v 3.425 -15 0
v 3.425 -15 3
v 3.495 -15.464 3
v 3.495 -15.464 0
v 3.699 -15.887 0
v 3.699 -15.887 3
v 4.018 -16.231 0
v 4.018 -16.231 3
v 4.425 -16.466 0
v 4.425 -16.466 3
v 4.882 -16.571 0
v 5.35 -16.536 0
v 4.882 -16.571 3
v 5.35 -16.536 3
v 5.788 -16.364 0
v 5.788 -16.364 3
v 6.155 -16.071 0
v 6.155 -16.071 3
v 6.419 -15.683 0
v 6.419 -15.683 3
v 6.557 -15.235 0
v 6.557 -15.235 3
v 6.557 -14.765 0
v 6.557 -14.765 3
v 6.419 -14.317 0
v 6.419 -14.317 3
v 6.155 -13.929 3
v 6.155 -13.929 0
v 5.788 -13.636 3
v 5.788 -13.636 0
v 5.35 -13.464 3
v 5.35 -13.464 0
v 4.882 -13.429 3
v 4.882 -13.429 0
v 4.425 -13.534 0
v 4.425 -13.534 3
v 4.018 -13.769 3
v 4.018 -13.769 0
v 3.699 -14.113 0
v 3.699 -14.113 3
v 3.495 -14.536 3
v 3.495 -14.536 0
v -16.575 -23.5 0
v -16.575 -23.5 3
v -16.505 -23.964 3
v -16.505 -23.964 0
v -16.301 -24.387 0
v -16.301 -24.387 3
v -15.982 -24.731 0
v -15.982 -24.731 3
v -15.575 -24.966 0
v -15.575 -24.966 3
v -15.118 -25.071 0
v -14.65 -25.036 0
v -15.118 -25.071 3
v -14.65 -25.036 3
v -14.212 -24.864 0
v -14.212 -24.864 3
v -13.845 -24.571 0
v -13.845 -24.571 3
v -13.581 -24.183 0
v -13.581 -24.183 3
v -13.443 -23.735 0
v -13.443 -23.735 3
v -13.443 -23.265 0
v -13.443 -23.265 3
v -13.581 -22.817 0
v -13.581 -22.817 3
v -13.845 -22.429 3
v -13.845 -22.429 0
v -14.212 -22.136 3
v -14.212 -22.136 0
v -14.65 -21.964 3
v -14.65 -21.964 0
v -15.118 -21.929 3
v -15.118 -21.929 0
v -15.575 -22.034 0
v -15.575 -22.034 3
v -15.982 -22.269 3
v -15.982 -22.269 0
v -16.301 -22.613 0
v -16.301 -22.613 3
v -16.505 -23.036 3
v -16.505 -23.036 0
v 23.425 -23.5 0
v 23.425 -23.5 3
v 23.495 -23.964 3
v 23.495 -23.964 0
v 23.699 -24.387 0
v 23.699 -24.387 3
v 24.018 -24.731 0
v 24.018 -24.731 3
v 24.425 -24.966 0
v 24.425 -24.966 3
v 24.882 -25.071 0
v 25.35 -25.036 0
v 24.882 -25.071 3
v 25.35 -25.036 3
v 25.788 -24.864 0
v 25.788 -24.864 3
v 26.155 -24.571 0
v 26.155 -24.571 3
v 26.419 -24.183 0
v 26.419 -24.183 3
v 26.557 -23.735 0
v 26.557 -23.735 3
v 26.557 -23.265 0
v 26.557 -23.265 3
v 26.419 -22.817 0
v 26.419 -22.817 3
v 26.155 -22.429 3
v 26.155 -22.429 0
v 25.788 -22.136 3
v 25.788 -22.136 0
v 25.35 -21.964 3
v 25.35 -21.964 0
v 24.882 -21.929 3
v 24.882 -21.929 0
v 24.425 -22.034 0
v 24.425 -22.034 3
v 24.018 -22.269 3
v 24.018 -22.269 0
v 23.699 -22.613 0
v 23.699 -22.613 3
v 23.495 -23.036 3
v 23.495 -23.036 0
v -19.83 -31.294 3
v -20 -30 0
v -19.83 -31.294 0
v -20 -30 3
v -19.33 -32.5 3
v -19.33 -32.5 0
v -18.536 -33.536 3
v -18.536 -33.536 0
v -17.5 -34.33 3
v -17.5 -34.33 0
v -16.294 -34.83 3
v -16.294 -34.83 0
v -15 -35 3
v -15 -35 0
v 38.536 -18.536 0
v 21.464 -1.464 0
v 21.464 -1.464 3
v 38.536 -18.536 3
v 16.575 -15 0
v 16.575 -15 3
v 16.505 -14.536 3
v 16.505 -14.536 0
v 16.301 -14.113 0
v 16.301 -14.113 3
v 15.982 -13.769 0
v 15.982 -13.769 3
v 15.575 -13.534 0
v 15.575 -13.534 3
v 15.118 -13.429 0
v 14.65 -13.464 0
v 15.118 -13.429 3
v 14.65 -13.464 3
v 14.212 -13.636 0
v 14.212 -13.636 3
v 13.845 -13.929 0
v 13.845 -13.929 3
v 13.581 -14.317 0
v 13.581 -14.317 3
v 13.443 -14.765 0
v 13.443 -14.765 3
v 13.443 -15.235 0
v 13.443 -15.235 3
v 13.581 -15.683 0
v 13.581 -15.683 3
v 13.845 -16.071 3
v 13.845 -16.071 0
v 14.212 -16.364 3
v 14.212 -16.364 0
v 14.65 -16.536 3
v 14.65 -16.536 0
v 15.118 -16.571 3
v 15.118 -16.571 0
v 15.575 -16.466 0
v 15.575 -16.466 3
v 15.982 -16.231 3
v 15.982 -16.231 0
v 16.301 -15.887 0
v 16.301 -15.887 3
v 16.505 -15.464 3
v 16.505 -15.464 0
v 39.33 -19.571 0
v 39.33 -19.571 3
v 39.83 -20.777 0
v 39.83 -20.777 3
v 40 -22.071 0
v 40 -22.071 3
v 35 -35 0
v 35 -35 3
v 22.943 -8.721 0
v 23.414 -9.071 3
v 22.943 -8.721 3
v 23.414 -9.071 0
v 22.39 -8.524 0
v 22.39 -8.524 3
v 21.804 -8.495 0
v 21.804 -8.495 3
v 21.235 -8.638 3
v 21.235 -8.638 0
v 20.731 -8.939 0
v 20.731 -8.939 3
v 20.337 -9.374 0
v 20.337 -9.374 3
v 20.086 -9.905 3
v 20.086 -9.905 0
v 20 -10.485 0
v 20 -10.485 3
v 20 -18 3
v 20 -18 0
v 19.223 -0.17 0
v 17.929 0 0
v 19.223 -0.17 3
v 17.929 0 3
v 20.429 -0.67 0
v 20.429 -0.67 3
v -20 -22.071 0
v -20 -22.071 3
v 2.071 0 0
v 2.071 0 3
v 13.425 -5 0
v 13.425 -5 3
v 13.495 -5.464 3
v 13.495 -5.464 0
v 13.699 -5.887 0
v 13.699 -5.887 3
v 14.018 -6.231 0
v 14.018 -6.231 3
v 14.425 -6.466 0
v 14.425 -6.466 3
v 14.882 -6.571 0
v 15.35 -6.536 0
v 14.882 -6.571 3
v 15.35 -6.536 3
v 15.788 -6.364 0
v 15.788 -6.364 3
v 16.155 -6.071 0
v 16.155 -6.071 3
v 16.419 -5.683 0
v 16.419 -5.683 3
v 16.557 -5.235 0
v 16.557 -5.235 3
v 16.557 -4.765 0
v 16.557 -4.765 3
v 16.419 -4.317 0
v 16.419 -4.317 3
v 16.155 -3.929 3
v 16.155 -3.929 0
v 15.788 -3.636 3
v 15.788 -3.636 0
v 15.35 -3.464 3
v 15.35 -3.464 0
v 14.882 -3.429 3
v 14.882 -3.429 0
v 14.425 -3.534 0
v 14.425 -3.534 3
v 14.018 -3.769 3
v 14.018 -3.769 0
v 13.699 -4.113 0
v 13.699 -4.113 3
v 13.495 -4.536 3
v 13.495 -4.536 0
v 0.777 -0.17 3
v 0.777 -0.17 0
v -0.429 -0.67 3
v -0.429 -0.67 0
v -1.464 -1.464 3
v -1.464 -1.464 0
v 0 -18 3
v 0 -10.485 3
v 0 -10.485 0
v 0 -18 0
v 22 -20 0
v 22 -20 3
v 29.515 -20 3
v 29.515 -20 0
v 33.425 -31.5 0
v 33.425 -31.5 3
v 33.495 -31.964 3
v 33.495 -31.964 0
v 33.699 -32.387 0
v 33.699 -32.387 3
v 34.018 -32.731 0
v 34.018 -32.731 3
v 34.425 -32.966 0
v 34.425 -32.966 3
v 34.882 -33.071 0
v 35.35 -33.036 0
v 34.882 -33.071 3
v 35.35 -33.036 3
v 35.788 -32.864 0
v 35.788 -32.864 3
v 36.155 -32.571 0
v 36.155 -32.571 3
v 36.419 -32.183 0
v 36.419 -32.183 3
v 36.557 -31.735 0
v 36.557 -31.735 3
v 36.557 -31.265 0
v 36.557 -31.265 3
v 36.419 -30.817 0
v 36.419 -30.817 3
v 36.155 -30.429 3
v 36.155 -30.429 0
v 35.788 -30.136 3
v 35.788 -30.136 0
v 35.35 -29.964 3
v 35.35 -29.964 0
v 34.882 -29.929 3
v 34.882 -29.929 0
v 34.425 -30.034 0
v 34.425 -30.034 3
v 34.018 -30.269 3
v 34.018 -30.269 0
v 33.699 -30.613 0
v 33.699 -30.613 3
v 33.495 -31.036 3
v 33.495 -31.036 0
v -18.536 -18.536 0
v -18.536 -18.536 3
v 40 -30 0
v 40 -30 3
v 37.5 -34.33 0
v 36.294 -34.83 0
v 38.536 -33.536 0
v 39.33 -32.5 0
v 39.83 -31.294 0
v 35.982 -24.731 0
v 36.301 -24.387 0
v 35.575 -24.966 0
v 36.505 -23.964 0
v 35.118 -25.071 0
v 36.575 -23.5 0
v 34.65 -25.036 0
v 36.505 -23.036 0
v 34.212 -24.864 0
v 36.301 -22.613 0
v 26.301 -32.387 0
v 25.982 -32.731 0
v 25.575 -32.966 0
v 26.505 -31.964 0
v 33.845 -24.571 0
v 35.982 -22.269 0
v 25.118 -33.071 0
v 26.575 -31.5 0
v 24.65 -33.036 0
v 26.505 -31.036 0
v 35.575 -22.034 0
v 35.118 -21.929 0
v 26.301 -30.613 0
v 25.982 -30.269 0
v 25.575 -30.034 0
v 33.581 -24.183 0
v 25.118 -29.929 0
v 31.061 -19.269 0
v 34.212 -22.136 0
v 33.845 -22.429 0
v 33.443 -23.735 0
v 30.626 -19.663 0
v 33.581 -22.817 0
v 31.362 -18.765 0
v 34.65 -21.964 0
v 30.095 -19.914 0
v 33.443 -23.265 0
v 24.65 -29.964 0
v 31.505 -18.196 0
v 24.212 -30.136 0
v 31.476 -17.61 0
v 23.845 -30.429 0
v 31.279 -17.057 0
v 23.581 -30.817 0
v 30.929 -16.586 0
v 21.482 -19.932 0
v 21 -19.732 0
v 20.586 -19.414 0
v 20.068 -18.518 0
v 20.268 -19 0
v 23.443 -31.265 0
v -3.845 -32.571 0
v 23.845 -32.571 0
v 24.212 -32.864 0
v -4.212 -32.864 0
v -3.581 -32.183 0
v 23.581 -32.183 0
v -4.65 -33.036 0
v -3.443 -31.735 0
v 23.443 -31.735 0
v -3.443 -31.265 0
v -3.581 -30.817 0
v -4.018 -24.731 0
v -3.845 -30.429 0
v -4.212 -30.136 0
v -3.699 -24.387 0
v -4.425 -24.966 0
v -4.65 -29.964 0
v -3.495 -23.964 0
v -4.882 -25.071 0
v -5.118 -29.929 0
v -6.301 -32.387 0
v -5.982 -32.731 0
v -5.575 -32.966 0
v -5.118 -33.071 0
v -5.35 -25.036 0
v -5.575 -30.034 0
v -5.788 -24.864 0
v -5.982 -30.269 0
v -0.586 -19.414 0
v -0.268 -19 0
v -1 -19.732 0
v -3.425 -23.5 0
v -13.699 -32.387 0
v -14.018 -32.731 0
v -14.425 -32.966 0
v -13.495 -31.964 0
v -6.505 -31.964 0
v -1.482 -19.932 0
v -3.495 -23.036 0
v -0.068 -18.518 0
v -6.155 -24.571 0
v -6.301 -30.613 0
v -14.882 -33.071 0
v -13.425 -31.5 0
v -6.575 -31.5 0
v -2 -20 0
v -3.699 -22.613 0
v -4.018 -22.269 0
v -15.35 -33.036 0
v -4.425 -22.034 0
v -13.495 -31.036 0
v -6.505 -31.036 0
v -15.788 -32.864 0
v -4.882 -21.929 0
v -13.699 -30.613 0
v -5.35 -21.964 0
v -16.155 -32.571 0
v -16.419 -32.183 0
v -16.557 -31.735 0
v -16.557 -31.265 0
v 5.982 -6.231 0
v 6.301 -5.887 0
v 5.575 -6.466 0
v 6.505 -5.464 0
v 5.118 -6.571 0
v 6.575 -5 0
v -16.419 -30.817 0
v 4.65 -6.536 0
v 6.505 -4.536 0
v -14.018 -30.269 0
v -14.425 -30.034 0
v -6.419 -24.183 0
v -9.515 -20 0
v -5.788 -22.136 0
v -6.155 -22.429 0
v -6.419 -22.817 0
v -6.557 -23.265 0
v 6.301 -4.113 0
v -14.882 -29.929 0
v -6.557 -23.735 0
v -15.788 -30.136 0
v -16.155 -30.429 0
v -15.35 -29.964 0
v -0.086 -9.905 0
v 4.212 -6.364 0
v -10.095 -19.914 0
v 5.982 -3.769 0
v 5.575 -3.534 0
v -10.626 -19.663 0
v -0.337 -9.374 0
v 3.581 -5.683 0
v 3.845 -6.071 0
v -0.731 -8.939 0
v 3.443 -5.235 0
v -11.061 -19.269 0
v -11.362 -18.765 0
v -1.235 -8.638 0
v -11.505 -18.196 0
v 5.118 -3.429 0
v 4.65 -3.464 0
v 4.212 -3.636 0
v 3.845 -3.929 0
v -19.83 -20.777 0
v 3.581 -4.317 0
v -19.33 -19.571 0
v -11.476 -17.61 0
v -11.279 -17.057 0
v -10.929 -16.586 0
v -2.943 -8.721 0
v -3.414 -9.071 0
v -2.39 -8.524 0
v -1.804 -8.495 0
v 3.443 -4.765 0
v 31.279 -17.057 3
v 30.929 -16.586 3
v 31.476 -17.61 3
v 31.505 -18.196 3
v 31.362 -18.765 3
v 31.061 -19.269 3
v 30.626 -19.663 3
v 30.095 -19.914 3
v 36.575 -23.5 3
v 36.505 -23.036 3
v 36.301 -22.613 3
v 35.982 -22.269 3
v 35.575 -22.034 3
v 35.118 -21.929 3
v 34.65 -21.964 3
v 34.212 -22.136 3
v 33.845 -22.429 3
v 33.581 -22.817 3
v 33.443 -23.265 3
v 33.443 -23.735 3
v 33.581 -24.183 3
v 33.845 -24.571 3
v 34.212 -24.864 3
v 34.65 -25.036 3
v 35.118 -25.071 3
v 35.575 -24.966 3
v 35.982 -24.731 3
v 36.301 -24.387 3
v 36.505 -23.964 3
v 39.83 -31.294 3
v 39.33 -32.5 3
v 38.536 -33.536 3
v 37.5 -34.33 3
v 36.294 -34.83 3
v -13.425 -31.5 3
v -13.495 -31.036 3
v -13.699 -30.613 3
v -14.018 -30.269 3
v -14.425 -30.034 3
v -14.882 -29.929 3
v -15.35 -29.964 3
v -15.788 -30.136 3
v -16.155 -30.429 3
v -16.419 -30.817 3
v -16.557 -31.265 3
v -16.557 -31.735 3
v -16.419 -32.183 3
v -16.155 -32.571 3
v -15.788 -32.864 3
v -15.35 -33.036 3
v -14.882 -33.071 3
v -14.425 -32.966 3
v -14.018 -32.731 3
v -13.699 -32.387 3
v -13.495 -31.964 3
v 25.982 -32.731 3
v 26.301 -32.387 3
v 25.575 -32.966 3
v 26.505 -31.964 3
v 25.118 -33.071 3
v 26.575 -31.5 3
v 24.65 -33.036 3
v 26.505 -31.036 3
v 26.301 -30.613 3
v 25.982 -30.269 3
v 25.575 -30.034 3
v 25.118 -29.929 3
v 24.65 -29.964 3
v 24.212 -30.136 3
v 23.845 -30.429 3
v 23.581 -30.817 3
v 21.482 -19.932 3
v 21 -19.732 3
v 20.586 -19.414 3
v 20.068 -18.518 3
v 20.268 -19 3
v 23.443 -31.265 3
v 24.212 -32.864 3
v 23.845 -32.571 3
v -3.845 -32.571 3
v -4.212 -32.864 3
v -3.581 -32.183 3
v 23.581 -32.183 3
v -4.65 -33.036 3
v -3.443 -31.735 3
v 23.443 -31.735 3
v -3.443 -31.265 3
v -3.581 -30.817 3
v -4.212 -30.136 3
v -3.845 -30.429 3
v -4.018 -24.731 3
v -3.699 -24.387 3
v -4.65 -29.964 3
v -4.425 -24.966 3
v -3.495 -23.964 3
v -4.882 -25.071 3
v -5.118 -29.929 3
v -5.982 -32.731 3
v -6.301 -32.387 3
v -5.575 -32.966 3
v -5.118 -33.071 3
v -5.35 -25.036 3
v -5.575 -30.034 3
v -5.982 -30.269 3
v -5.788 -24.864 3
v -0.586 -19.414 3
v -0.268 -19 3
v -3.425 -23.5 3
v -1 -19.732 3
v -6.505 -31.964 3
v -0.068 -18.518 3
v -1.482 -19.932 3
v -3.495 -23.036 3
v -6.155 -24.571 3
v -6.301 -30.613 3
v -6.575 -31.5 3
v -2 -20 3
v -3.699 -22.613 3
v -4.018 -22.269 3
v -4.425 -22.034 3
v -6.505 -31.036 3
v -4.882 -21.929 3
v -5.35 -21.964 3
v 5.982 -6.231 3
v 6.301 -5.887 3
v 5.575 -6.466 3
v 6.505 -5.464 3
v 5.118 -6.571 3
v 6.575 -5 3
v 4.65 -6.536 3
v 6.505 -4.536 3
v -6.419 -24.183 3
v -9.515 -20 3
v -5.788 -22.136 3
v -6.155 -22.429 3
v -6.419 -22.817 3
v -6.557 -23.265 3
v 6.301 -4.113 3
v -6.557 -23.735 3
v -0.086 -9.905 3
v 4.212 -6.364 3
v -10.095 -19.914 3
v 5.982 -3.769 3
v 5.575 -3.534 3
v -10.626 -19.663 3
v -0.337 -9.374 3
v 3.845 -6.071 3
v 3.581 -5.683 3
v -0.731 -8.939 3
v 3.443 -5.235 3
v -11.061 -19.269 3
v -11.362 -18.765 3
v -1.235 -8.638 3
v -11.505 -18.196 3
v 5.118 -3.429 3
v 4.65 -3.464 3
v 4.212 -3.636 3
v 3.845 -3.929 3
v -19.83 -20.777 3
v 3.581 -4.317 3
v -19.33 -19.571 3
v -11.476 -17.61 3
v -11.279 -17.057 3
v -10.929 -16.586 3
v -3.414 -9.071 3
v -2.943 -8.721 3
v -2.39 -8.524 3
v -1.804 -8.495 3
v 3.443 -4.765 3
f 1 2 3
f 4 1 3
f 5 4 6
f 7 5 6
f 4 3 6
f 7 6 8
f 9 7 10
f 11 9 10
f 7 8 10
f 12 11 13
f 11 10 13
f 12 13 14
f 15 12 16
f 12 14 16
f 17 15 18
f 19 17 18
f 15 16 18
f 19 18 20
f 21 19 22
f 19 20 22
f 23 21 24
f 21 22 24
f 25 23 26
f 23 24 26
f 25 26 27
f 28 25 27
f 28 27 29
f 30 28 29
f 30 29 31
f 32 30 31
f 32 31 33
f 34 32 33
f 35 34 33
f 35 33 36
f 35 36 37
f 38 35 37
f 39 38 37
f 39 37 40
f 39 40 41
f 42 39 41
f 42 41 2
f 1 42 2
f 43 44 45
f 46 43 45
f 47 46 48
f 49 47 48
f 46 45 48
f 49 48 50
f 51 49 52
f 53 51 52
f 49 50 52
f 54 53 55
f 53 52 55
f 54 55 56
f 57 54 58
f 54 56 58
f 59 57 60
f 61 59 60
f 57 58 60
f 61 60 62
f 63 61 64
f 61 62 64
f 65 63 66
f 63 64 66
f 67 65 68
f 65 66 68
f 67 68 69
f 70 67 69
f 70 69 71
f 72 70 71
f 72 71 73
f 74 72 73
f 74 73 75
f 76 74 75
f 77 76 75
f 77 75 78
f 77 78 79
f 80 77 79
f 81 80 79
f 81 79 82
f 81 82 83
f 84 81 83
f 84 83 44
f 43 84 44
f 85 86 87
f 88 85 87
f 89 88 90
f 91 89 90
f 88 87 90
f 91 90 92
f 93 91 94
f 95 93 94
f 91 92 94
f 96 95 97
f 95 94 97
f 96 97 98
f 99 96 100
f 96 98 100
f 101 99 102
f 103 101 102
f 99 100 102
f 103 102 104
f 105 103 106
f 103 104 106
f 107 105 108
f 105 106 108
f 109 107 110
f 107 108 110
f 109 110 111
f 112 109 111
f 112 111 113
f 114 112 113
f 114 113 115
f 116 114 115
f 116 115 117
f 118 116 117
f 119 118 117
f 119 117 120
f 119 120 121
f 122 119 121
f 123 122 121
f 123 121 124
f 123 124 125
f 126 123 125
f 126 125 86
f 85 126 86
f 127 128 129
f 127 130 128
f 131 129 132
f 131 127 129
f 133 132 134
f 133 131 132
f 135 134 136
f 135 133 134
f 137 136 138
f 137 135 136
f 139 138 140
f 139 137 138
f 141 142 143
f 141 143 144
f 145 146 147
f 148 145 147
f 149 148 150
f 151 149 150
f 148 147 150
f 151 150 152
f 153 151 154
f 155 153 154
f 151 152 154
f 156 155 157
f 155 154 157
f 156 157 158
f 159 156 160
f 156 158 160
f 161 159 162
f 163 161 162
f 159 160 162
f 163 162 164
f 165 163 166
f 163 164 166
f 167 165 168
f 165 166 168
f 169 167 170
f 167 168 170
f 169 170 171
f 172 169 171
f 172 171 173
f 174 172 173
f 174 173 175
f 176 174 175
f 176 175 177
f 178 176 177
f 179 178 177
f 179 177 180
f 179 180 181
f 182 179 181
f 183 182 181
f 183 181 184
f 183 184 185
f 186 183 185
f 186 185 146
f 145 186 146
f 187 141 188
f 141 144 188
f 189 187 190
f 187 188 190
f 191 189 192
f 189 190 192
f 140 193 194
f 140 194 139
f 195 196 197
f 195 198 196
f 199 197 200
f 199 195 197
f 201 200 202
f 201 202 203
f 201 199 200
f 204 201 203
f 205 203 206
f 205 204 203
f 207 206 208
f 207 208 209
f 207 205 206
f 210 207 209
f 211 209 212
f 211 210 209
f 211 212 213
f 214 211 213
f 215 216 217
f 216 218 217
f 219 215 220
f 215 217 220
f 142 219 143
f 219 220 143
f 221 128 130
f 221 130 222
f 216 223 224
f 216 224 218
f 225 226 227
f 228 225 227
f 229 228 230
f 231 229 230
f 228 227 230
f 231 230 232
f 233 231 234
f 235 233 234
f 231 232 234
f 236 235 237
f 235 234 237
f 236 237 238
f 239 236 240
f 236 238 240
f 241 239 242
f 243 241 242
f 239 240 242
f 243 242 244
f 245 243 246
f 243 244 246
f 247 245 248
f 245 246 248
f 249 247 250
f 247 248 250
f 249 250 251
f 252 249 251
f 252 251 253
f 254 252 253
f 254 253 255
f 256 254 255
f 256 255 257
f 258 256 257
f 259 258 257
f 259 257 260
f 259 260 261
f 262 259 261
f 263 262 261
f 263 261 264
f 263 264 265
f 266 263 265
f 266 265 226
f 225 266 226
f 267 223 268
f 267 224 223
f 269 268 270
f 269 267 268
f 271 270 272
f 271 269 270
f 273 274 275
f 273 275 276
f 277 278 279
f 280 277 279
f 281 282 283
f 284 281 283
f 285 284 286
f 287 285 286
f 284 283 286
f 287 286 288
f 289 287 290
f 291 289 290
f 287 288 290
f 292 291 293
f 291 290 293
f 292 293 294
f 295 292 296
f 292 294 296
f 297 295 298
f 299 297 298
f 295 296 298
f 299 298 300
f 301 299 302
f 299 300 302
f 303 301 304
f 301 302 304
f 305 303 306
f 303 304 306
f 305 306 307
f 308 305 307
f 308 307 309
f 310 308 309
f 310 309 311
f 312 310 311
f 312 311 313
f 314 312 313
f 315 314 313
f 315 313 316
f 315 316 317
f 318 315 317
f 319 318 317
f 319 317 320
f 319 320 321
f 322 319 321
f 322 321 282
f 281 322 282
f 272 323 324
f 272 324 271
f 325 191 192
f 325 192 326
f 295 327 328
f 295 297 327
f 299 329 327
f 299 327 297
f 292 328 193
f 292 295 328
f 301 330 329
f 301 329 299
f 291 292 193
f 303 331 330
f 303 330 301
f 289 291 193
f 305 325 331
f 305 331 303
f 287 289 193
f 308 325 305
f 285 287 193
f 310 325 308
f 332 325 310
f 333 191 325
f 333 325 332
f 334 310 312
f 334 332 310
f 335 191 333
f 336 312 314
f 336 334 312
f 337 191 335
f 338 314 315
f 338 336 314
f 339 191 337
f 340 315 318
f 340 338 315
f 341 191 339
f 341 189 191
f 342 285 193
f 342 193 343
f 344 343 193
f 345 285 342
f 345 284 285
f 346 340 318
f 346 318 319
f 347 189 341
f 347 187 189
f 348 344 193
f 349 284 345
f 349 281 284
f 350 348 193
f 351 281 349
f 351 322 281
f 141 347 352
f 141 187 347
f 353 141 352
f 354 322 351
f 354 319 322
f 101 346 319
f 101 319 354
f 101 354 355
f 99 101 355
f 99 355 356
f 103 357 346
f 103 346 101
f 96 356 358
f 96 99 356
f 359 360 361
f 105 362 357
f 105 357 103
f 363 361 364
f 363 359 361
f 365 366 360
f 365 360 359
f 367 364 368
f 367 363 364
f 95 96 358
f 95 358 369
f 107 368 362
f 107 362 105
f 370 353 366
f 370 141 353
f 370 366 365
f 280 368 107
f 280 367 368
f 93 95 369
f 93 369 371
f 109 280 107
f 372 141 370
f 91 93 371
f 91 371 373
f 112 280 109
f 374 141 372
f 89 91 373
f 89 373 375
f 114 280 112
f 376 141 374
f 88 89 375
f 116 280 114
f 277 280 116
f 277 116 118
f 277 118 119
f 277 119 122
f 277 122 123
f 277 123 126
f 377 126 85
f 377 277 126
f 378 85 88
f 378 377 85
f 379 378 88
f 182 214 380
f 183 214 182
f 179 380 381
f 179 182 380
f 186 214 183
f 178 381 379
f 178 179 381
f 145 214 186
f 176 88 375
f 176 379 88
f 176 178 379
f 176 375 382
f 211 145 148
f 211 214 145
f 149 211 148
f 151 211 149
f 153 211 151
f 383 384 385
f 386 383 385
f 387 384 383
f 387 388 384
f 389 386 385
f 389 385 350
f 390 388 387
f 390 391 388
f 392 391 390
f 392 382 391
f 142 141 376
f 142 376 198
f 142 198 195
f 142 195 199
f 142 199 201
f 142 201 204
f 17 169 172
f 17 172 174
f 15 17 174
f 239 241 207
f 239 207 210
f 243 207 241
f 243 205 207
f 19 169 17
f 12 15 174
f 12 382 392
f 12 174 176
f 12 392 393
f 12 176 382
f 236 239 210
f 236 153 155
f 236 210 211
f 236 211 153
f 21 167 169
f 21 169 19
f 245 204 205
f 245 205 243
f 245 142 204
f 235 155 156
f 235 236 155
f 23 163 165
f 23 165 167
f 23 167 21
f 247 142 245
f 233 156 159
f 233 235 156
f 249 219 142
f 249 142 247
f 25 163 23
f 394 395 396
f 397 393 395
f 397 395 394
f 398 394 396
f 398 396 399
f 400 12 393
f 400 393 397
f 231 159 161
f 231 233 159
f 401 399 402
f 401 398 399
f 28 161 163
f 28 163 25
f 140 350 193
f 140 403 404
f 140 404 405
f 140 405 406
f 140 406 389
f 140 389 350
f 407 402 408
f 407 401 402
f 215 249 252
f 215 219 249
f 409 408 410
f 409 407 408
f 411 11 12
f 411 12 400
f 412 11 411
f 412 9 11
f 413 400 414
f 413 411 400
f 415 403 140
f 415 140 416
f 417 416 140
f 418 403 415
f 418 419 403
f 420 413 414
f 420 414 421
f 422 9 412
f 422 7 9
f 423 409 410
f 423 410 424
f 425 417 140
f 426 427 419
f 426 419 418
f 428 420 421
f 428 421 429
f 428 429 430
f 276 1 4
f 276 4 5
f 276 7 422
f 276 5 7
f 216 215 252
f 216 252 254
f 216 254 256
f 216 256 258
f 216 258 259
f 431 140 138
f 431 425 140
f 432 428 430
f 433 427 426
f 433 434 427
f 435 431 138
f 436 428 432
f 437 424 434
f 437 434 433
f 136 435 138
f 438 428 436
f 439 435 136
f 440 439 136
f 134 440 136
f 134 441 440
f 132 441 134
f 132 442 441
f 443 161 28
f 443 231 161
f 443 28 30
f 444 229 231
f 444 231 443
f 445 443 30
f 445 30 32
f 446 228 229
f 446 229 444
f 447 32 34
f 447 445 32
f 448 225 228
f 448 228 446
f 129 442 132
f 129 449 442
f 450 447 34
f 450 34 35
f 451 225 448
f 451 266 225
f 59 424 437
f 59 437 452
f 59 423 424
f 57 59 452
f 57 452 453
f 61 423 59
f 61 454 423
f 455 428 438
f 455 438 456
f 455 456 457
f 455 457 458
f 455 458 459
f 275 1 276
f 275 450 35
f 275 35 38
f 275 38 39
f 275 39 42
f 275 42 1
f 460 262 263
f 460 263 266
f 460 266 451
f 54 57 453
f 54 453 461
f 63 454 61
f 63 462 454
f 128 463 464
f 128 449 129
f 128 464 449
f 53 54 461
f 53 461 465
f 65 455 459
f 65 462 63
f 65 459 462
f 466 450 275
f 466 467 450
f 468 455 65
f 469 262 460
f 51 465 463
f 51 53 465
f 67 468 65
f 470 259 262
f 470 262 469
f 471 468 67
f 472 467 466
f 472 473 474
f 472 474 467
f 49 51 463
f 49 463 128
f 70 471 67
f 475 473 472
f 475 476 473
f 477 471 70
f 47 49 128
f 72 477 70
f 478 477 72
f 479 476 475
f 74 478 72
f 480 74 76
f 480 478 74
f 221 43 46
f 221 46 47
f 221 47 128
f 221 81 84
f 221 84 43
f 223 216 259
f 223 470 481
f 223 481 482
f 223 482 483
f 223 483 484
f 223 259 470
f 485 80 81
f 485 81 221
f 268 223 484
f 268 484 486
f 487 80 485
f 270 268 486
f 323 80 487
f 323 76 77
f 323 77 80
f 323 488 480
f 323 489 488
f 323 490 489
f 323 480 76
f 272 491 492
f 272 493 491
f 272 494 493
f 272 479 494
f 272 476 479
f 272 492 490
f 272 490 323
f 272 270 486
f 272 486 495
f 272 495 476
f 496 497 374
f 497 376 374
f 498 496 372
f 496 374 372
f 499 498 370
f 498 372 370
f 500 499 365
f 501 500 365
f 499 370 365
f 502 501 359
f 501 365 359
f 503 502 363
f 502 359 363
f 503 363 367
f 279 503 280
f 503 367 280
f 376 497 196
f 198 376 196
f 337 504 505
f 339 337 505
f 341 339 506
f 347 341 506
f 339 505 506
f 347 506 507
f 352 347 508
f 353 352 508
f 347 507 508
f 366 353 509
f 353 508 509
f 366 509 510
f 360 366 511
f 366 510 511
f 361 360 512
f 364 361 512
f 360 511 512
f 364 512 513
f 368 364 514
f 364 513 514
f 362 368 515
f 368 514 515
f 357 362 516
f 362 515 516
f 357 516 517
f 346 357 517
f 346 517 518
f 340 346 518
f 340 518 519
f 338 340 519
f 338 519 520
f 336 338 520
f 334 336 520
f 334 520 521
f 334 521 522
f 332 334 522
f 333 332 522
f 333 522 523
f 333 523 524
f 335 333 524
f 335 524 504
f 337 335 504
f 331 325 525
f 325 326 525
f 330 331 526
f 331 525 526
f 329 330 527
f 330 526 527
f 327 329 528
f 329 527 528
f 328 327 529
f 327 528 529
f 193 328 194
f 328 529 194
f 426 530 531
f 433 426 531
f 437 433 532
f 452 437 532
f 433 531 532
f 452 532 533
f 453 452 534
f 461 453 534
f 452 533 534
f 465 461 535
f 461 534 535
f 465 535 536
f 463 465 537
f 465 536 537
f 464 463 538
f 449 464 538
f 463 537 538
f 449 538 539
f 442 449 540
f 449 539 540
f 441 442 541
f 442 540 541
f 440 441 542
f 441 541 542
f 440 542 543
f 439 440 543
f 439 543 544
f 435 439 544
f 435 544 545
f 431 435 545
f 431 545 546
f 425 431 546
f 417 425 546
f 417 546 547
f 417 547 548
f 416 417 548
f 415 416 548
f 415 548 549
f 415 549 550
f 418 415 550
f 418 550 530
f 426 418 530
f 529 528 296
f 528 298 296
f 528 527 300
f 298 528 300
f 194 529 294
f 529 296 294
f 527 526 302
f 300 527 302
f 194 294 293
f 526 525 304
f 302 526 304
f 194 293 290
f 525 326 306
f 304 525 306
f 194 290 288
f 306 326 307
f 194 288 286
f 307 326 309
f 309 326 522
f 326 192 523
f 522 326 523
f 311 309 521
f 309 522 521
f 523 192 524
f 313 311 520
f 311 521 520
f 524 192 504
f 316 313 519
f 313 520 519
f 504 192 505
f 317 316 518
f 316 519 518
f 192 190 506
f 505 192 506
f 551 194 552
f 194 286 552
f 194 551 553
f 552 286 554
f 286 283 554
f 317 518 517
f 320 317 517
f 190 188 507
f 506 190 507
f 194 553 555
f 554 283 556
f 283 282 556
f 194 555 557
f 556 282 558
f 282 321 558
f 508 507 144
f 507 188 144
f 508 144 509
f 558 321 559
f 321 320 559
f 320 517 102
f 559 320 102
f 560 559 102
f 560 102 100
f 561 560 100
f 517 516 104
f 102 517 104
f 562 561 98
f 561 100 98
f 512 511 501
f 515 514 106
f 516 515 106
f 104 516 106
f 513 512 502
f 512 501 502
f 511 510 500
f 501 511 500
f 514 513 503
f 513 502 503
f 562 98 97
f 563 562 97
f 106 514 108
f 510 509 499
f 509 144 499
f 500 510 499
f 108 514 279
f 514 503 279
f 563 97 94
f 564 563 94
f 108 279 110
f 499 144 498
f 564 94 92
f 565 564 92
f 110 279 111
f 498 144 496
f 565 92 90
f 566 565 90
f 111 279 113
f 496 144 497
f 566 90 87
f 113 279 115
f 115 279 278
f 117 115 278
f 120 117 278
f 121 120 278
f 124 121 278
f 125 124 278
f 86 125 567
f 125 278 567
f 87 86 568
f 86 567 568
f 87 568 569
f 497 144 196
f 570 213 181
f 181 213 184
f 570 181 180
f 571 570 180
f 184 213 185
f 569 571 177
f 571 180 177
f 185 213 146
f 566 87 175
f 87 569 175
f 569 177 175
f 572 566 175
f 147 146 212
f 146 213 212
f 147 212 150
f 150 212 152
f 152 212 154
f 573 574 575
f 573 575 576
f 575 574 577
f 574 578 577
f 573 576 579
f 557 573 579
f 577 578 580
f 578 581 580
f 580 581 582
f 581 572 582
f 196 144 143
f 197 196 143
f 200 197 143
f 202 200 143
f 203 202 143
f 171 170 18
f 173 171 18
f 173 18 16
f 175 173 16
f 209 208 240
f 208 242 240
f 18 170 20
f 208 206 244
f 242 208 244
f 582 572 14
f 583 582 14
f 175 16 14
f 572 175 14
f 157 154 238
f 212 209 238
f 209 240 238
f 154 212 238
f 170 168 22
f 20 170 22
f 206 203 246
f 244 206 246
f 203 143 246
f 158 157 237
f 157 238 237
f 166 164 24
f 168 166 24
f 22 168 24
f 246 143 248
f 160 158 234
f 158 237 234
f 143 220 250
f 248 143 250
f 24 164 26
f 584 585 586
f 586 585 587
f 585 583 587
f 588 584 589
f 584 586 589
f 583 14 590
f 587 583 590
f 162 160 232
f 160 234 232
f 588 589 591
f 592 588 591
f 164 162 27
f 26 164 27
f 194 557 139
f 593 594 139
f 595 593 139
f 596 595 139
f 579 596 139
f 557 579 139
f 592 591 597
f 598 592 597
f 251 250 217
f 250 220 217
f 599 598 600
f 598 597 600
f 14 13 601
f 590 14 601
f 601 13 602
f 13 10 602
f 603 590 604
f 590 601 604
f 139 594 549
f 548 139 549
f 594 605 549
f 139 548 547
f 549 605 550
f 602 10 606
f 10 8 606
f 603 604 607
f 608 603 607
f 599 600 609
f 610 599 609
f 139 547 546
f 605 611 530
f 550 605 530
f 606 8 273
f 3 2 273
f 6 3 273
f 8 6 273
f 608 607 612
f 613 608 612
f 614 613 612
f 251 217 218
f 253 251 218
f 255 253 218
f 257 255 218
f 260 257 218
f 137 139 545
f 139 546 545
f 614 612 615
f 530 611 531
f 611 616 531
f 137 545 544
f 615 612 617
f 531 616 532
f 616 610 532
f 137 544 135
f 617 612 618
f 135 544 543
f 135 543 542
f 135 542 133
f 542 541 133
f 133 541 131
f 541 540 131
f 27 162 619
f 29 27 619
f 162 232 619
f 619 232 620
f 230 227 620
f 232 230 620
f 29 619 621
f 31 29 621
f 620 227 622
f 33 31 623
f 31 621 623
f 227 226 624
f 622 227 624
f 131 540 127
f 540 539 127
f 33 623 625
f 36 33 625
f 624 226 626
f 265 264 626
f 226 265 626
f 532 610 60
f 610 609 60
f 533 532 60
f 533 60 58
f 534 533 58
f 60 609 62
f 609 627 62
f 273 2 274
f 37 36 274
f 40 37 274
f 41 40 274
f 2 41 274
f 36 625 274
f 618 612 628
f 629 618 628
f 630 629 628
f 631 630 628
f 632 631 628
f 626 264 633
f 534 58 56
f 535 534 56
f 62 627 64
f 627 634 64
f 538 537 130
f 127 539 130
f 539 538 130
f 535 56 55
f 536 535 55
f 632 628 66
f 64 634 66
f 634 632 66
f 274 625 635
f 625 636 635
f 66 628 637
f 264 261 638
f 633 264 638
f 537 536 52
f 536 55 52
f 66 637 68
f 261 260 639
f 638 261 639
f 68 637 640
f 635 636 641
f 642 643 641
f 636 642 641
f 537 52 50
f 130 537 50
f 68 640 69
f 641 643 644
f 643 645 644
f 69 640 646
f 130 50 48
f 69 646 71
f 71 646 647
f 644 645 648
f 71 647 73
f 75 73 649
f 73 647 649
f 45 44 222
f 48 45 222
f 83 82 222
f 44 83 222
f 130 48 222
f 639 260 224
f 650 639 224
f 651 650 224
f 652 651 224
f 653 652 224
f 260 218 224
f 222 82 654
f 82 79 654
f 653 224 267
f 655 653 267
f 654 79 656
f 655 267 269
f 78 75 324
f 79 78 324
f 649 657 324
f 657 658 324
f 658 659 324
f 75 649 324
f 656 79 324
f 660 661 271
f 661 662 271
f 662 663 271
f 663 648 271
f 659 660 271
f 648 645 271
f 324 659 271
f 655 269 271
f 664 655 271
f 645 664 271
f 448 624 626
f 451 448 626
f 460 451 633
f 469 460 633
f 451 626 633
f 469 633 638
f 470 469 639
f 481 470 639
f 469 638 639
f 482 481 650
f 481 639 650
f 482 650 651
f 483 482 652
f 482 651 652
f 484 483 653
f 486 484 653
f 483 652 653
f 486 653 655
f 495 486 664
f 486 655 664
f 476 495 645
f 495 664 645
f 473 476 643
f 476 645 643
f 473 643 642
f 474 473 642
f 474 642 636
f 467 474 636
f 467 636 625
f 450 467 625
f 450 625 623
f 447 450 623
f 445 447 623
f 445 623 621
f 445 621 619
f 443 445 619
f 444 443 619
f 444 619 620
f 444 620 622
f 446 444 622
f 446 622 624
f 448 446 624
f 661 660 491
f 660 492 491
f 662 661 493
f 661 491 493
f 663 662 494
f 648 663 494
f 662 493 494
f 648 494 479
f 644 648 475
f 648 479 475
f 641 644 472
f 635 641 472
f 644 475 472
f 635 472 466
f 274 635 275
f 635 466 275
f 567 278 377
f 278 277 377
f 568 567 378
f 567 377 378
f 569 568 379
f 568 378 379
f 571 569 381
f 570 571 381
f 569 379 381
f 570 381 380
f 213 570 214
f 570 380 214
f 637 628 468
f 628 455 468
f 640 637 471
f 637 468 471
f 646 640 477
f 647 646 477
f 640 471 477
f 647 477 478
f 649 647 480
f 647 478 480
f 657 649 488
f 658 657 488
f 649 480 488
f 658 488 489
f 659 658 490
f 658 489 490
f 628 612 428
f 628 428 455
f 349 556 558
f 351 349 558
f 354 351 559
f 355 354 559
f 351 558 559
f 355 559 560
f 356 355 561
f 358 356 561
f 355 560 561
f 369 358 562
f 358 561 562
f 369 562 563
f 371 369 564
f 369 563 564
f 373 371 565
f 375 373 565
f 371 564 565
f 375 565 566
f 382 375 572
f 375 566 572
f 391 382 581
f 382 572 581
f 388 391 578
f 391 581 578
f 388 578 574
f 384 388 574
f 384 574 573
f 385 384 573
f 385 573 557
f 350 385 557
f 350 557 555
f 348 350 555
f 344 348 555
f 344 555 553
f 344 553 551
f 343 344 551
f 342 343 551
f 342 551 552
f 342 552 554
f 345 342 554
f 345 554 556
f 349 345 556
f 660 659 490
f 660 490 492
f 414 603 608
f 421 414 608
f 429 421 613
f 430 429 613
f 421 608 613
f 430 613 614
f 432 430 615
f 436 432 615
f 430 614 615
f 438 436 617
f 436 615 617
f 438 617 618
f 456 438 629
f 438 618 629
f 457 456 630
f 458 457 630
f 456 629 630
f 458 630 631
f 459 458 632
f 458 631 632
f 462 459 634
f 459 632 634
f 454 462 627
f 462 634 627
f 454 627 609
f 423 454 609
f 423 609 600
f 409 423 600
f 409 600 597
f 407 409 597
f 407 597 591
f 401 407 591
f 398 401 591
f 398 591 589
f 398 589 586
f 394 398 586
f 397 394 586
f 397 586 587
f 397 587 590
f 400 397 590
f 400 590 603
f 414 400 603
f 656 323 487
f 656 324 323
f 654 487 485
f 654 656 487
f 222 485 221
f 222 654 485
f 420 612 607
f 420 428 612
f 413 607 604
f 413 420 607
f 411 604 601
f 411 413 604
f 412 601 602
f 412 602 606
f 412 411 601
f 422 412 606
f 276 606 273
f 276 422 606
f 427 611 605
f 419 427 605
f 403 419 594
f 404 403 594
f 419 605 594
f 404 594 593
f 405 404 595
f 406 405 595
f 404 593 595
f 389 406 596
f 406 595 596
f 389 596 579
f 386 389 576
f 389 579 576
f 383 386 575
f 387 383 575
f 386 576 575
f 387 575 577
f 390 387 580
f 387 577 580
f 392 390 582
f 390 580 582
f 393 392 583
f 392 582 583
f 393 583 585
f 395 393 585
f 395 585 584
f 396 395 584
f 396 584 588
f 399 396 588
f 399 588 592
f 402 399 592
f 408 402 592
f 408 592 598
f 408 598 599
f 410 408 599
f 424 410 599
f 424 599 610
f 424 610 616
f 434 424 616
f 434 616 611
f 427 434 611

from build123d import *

# Parameters (mm, degrees)
EXTRUDE_1_DEPTH     = 3
SKETCH_2_R          = 1.575
CUT_EXTRUDE_1_DEPTH = 54.235326617
FILLET_1_R          = 2
FILLET_2_R          = 5


with BuildPart() as part:
    # 草图1 → 凸台-拉伸1 (new body)
    with BuildSketch(Plane.XY):
        Polygon((0, 0), (20, 0), (40, -20), (40, -35), (-20, -35), (-20, -20), align=None)
    extrude(amount=EXTRUDE_1_DEPTH)

    # 草图2 → 切除-拉伸1 (cut, through all)
    with BuildSketch(Plane.XY.offset(3)):
        with Locations((5, -5)):
            Circle(SKETCH_2_R)
        with Locations(Location((15, -5, 0), (0, 0, 180))):
            Circle(SKETCH_2_R)
        with Locations((15, -15)):
            Circle(SKETCH_2_R)
        with Locations(Location((5, -15, 0), (0, 0, 180))):
            Circle(SKETCH_2_R)
        with Locations((-15, -31.5)):
            Circle(SKETCH_2_R)
        with Locations(Location((-15, -23.5, 0), (0, 0, 180))):
            Circle(SKETCH_2_R)
        with Locations(Location((-5, -31.5, 0), (0, 0, 180))):
            Circle(SKETCH_2_R)
        with Locations((-5, -23.5)):
            Circle(SKETCH_2_R)
        with Locations((25, -31.5)):
            Circle(SKETCH_2_R)
        with Locations(Location((35, -31.5, 0), (0, 0, 180))):
            Circle(SKETCH_2_R)
        with Locations(Location((25, -23.5, 0), (0, 0, 180))):
            Circle(SKETCH_2_R)
        with Locations((35, -23.5)):
            Circle(SKETCH_2_R)
        Polygon((0, -5.656854249), (0, -20), (-14.343145751, -20), align=None)
        Polygon((34.343145751, -20), (20, -5.656854249), (20, -20), align=None)
    extrude(amount=-CUT_EXTRUDE_1_DEPTH, mode=Mode.SUBTRACT)

    # 圆角1
    fillet_1_edges = [part.edges().sort_by_distance(p)[0] for p in [
        (34.343145751, -20, 1.5),
        (20, -20, 1.5),
        (20, -5.656854249, 1.5),
        (-14.343145751, -20, 1.5),
        (0, -5.656854249, 1.5),
        (0, -20, 1.5),
    ]]
    fillet(fillet_1_edges, radius=FILLET_1_R)

    # 圆角2
    fillet_2_edges = [part.edges().sort_by_distance(p)[0] for p in [
        (0, 0, 1.5),
        (20, 0, 1.5),
        (40, -20, 1.5),
        (40, -35, 1.5),
        (-20, -35, 1.5),
        (-20, -20, 1.5),
    ]]
    fillet(fillet_2_edges, radius=FILLET_2_R)


solid = part.part
